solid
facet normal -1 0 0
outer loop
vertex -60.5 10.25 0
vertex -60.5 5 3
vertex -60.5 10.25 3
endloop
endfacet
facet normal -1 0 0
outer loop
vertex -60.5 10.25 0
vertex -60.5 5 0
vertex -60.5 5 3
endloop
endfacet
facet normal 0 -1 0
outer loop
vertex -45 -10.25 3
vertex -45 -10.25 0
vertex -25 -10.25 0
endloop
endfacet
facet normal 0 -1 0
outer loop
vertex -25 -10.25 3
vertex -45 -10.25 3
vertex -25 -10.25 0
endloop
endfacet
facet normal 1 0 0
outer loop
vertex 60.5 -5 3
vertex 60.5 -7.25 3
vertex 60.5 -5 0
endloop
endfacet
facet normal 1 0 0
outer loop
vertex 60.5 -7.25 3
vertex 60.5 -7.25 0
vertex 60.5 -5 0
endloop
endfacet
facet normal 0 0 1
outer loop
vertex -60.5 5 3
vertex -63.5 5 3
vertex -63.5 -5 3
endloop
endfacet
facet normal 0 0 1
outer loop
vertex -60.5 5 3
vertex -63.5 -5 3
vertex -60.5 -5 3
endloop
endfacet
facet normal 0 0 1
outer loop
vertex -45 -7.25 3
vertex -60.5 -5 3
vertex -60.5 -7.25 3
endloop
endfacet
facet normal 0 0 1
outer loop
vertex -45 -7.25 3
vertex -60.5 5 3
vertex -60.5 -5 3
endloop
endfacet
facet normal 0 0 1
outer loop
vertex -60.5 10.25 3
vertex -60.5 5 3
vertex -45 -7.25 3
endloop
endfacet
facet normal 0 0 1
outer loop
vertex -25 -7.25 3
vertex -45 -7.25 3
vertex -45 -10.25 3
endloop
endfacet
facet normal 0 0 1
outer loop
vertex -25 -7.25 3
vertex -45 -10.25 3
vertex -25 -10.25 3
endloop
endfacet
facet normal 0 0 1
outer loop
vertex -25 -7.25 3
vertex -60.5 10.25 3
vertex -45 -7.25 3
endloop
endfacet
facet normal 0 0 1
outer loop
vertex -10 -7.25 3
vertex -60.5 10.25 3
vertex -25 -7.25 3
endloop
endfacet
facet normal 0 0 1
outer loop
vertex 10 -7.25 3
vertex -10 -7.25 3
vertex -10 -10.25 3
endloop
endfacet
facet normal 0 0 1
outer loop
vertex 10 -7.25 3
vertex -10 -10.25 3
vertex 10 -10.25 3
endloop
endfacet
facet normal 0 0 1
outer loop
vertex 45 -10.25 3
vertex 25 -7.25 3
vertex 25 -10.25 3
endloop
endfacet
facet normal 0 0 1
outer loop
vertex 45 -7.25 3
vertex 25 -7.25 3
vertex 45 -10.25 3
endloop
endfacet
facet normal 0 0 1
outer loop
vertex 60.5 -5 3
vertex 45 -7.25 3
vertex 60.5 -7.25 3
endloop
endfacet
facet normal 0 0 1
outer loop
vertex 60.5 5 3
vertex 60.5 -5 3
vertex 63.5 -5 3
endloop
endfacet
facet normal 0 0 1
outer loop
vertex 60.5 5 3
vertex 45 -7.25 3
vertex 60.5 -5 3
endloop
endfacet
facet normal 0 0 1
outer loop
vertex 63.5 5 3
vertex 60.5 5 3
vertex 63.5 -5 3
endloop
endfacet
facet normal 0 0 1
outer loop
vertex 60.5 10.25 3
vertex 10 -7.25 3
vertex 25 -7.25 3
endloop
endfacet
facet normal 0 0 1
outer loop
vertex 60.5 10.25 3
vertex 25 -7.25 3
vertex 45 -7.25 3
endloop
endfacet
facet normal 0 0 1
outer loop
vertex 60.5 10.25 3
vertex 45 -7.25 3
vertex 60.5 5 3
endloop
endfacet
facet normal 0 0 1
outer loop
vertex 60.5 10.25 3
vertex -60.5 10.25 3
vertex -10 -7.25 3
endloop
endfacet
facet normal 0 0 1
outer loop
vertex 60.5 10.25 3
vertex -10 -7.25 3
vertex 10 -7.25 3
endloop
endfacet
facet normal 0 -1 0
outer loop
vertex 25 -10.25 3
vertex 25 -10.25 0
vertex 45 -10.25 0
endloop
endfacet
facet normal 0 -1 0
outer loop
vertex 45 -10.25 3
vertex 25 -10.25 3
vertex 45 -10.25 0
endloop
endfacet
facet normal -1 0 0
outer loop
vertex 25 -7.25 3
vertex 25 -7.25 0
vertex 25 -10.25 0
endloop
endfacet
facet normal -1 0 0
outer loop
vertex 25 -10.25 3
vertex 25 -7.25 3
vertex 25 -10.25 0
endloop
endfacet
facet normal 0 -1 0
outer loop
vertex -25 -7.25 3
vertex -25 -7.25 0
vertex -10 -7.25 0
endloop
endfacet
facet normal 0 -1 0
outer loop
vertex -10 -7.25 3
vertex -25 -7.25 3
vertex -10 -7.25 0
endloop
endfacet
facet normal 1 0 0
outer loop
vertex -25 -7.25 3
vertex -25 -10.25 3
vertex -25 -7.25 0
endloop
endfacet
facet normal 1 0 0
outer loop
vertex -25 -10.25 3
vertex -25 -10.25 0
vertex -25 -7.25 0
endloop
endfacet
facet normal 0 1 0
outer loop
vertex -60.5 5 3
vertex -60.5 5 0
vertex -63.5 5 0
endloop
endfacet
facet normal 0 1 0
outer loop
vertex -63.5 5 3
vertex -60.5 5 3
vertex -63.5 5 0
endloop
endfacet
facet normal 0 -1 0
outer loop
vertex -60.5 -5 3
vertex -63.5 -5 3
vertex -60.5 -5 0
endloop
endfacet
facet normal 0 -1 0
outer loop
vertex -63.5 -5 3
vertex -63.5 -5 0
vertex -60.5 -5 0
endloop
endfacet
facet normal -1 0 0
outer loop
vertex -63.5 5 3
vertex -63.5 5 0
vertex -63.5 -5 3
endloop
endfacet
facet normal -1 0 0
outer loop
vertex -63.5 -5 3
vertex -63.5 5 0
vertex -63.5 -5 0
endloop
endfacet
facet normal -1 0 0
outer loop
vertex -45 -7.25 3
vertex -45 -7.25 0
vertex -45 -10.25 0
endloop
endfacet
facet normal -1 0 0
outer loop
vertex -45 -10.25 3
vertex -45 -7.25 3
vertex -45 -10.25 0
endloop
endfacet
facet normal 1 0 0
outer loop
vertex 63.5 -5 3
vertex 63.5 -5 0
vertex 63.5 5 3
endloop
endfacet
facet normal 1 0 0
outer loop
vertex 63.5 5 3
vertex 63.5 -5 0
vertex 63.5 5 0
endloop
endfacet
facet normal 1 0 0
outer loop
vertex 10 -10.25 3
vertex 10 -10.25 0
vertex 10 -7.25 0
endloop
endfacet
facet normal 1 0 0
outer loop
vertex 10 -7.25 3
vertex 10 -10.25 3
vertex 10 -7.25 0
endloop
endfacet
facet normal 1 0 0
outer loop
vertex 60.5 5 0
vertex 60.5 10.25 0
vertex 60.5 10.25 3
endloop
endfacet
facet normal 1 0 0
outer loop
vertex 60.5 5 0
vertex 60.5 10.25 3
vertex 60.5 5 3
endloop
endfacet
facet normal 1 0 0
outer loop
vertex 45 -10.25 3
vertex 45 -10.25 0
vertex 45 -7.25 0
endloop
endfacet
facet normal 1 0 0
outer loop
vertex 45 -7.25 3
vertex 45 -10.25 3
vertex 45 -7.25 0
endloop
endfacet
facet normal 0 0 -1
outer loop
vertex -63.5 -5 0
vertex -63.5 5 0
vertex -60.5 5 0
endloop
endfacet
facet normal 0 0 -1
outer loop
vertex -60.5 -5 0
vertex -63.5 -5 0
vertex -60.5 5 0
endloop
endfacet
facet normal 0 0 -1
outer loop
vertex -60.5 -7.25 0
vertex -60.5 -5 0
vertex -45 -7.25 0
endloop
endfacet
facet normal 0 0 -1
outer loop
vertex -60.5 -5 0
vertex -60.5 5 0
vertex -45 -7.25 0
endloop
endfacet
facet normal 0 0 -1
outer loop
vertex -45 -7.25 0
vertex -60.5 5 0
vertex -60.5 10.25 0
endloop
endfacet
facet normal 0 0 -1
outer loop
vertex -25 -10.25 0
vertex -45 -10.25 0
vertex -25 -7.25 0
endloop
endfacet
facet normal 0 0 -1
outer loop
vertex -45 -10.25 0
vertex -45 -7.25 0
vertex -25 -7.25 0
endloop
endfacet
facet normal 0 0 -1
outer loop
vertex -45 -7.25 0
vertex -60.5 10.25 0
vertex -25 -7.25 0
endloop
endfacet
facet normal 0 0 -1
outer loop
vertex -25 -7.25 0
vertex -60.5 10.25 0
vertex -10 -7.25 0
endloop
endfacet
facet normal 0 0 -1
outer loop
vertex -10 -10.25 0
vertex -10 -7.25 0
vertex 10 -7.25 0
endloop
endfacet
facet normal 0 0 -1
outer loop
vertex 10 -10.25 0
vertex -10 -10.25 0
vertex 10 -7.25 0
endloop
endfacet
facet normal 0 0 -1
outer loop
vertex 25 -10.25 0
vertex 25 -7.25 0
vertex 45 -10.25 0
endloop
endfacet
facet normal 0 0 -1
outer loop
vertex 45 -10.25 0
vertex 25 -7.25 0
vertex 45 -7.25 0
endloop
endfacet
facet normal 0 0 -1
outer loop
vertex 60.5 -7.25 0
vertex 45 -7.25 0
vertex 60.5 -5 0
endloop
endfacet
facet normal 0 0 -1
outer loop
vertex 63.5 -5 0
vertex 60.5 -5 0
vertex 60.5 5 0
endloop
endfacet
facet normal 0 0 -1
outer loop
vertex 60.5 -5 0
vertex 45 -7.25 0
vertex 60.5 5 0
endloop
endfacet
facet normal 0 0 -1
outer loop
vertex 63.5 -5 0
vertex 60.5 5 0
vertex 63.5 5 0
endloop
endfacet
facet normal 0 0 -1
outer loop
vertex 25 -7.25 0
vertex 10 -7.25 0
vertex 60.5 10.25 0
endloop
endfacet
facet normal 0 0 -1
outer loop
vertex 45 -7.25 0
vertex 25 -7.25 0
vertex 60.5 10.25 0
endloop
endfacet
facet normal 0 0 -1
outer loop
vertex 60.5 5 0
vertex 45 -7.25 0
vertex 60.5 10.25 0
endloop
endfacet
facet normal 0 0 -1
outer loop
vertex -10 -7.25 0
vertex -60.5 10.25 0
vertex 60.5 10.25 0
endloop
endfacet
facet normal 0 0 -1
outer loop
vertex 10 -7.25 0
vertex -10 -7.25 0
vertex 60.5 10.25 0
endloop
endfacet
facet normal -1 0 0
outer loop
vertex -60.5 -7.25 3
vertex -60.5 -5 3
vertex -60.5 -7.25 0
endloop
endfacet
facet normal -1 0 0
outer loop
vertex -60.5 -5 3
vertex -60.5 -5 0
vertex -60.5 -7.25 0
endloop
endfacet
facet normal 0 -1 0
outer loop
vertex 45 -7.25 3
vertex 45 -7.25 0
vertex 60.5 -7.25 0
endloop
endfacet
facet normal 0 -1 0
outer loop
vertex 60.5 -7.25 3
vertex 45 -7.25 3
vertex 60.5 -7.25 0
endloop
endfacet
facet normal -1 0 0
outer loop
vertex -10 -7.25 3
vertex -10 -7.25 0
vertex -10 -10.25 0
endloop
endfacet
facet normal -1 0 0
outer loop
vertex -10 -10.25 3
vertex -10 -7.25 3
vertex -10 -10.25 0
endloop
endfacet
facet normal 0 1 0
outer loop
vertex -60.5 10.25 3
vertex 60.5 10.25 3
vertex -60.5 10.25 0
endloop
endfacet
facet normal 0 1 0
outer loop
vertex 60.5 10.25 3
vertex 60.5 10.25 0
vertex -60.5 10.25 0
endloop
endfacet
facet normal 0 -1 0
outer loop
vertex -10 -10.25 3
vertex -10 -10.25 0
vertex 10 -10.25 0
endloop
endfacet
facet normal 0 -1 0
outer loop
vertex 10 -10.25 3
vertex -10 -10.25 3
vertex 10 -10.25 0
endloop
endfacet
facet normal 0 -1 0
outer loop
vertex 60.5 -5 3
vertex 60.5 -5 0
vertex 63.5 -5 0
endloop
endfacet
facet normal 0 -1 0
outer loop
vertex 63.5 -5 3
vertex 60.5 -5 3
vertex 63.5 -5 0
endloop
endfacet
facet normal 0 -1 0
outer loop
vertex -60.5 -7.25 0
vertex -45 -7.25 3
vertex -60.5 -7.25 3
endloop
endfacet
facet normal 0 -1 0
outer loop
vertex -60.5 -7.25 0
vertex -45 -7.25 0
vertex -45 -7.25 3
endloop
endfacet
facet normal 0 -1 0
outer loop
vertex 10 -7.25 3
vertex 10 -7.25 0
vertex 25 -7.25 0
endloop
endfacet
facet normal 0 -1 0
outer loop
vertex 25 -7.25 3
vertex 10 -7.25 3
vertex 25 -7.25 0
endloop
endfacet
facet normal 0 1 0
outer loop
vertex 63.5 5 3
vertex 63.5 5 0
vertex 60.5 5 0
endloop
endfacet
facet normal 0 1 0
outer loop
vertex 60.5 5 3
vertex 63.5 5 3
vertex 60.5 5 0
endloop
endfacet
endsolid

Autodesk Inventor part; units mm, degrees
ref_plane "YZ Plane" through (0, 0, 0) normal (1, 0, 0) x (0, 1, 0)
ref_plane "XZ Plane" through (0, 0, 0) normal (0, 1, 0) x (-1, 0, 0)
ref_plane "XY Plane" through (0, 0, 0) normal (0, 0, 1) x (1, 0, 0)
sketch "Sketch1" plane through (0, 0, 0) normal (0, 0, 1) x (1, 0, 0)
  line L0 (-63.5, -10.25) -> (63.5, -10.25)
  line L1 (63.5, -10.25) -> (63.5, 10.25)
  line L2 (63.5, 10.25) -> (-63.5, 10.25)
  line L3 (-63.5, 10.25) -> (-63.5, -10.25)
  line L4 (-63.5, -10.25) -> (63.5, 10.25) construction
  line L5 (63.5, -10.25) -> (-63.5, 10.25) construction
  line L6 (-63.5, -5) -> (-60.5, -5)
  line L7 (-60.5, -5) -> (-60.5, 5) construction
  line L8 (-60.5, 5) -> (-63.5, 5)
  line L9 (-63.5, 5) -> (-63.5, -5)
  line L10 (-63.5, -5) -> (-60.5, 5) construction
  line L11 (-60.5, -5) -> (-63.5, 5) construction
  line L12 (-45, -10.25) -> (-25, -10.25)
  line L13 (-25, -10.25) -> (-25, -7.25)
  line L14 (-25, -7.25) -> (-45, -7.25) construction
  line L15 (-45, -7.25) -> (-45, -10.25)
  line L16 (-45, -10.25) -> (-25, -7.25) construction
  line L17 (-25, -10.25) -> (-45, -7.25) construction
  line L18 (-10, -10.25) -> (10, -10.25)
  line L19 (10, -10.25) -> (10, -7.25)
  line L20 (10, -7.25) -> (-10, -7.25) construction
  line L21 (-10, -7.25) -> (-10, -10.25)
  line L22 (-10, -10.25) -> (10, -7.25) construction
  line L23 (10, -10.25) -> (-10, -7.25) construction
  line L24 (25, -7.25) -> (25, -10.25)
  line L25 (45, -10.25) -> (45, -7.25)
  line L26 (25, -10.25) -> (45, -10.25)
  line L27 (45, -10.25) -> (25, -7.25) construction
  line L28 (45, -7.25) -> (25, -7.25) construction
  line L29 (25, -10.25) -> (45, -7.25) construction
  line L30 (-45, -7.25) -> (-63.5, -7.25)
  line L31 (-25, -7.25) -> (-10, -7.25)
  line L32 (10, -7.25) -> (25, -7.25)
  line L33 (45, -7.25) -> (63.5, -7.25)
  line L34 (-60.5, 5) -> (-60.5, 10.25)
  line L35 (-60.5, -5) -> (-60.5, -10.25)
  point P0 (0, 0)
  point P1 (-62, 0)
  point P2 (-63.5, 0)
  point P3 (-35, -8.75)
  point P4 (0, -8.75)
  point P5 (35, -8.75)
  point P6 (0, -10.25)
  point P7 (-45, -10.25)
  point P8 (-25, -10.25)
  point P9 (-10, -10.25)
  point P10 (10, -10.25)
  point P11 (25, -10.25)
  point P12 (45, -10.25)
  point P13 (-60.5, -7.25)
  dimension "d0" = 20.5
  dimension "d1" = 127
  dimension "d2" = 10
  dimension "d3" = 3
  dimension "d4" = 3
  dimension "d5" = 20
  dimension "d6" = 3
  dimension "d7" = 20
  dimension "d8" = 35
  dimension "d9" = 3
  dimension "d10" = 20
  dimension "d11" = 35
extrude "Extrusion1" add sketch "Sketch1" along normal blind 3 contours L3 L6 L35 L30 | L15 L30 L35 L6 L3 L8 L34 L2 L1 L33 L25 L0 L24 L32 L19 L21 L31 L13 | L3 L2 L34 L8
extrude "Extrusion2" cut sketch "Sketch1" along normal through all contours L3 L30 L35 L0 | L35 L30 L15 L0 | L3 L6 L35 L30 | L13 L31 L21 L0 | L3 L2 L34 L8 | L19 L32 L24 L0 | L25 L33 L1 L0
mirror "Mirror1" about plane through (0, 0, 0) normal (1, 0, 0) of "Extrusion2"
equation "\"d4\" = d3"
equation "\"d6\" = d3"
equation "\"d7\" = d5"
equation "\"d9\" = d6"
equation "\"d10\" = d7"
equation "\"d11\" = d8"
properties part number "bed_acrylic_upper_front"
